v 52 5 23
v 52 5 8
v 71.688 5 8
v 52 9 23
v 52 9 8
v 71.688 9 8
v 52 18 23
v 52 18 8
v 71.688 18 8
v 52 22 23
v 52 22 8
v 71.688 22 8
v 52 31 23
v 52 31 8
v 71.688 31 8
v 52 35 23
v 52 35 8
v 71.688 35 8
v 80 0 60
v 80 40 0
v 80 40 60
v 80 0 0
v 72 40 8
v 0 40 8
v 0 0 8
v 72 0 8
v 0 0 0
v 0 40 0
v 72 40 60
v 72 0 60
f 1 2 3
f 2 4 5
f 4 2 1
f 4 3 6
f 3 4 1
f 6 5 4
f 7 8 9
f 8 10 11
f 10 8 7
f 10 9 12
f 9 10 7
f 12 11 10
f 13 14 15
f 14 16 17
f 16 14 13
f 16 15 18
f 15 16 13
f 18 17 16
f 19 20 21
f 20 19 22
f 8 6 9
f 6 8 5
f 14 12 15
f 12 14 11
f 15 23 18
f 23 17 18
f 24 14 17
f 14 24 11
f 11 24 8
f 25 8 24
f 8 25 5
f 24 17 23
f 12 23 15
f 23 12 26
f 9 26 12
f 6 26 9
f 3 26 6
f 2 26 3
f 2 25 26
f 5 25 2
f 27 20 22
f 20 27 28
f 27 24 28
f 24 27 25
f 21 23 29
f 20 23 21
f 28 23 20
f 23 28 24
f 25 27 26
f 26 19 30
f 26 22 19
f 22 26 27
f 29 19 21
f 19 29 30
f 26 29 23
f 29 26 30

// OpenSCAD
$fn = 32;

// ----------------------------------------------------------------------
// Rib bracket: 3-gusset L bracket
// ----------------------------------------------------------------------

// --- parameters (mm) ---
base_l = 80;              // foot length, X
base_w = 40;              // foot width, Y
base_t = 8;               // foot thickness
plate_t = 8;              // upright plate thickness
plate_h = 60;             // overall height
gus_l = 20;               // gusset leg along the foot
gus_h = 16;               // gusset height
gus_t = 4;                // gusset thickness
gus_edge = 5;             // gusset margin from the foot edge
n_gus = 3;                // gusset count

gus_pitch = (base_w - 2 * gus_edge - gus_t) / (n_gus - 1);  // gusset pitch

union() {
  cube([base_l, base_w, base_t]);
  translate([base_l - plate_t, 0, base_t - 1])
    cube([plate_t, base_w, plate_h - base_t + 1]);
  for (i = [0 : n_gus - 1])
    translate([base_l - plate_t - gus_l, gus_edge + i * gus_pitch, base_t - 1])
      rotate([-90, 0, 0])
        linear_extrude(height = gus_t)
          polygon(points = [[0, 0], [gus_l + 1, 0], [0, -gus_h]]);
}
